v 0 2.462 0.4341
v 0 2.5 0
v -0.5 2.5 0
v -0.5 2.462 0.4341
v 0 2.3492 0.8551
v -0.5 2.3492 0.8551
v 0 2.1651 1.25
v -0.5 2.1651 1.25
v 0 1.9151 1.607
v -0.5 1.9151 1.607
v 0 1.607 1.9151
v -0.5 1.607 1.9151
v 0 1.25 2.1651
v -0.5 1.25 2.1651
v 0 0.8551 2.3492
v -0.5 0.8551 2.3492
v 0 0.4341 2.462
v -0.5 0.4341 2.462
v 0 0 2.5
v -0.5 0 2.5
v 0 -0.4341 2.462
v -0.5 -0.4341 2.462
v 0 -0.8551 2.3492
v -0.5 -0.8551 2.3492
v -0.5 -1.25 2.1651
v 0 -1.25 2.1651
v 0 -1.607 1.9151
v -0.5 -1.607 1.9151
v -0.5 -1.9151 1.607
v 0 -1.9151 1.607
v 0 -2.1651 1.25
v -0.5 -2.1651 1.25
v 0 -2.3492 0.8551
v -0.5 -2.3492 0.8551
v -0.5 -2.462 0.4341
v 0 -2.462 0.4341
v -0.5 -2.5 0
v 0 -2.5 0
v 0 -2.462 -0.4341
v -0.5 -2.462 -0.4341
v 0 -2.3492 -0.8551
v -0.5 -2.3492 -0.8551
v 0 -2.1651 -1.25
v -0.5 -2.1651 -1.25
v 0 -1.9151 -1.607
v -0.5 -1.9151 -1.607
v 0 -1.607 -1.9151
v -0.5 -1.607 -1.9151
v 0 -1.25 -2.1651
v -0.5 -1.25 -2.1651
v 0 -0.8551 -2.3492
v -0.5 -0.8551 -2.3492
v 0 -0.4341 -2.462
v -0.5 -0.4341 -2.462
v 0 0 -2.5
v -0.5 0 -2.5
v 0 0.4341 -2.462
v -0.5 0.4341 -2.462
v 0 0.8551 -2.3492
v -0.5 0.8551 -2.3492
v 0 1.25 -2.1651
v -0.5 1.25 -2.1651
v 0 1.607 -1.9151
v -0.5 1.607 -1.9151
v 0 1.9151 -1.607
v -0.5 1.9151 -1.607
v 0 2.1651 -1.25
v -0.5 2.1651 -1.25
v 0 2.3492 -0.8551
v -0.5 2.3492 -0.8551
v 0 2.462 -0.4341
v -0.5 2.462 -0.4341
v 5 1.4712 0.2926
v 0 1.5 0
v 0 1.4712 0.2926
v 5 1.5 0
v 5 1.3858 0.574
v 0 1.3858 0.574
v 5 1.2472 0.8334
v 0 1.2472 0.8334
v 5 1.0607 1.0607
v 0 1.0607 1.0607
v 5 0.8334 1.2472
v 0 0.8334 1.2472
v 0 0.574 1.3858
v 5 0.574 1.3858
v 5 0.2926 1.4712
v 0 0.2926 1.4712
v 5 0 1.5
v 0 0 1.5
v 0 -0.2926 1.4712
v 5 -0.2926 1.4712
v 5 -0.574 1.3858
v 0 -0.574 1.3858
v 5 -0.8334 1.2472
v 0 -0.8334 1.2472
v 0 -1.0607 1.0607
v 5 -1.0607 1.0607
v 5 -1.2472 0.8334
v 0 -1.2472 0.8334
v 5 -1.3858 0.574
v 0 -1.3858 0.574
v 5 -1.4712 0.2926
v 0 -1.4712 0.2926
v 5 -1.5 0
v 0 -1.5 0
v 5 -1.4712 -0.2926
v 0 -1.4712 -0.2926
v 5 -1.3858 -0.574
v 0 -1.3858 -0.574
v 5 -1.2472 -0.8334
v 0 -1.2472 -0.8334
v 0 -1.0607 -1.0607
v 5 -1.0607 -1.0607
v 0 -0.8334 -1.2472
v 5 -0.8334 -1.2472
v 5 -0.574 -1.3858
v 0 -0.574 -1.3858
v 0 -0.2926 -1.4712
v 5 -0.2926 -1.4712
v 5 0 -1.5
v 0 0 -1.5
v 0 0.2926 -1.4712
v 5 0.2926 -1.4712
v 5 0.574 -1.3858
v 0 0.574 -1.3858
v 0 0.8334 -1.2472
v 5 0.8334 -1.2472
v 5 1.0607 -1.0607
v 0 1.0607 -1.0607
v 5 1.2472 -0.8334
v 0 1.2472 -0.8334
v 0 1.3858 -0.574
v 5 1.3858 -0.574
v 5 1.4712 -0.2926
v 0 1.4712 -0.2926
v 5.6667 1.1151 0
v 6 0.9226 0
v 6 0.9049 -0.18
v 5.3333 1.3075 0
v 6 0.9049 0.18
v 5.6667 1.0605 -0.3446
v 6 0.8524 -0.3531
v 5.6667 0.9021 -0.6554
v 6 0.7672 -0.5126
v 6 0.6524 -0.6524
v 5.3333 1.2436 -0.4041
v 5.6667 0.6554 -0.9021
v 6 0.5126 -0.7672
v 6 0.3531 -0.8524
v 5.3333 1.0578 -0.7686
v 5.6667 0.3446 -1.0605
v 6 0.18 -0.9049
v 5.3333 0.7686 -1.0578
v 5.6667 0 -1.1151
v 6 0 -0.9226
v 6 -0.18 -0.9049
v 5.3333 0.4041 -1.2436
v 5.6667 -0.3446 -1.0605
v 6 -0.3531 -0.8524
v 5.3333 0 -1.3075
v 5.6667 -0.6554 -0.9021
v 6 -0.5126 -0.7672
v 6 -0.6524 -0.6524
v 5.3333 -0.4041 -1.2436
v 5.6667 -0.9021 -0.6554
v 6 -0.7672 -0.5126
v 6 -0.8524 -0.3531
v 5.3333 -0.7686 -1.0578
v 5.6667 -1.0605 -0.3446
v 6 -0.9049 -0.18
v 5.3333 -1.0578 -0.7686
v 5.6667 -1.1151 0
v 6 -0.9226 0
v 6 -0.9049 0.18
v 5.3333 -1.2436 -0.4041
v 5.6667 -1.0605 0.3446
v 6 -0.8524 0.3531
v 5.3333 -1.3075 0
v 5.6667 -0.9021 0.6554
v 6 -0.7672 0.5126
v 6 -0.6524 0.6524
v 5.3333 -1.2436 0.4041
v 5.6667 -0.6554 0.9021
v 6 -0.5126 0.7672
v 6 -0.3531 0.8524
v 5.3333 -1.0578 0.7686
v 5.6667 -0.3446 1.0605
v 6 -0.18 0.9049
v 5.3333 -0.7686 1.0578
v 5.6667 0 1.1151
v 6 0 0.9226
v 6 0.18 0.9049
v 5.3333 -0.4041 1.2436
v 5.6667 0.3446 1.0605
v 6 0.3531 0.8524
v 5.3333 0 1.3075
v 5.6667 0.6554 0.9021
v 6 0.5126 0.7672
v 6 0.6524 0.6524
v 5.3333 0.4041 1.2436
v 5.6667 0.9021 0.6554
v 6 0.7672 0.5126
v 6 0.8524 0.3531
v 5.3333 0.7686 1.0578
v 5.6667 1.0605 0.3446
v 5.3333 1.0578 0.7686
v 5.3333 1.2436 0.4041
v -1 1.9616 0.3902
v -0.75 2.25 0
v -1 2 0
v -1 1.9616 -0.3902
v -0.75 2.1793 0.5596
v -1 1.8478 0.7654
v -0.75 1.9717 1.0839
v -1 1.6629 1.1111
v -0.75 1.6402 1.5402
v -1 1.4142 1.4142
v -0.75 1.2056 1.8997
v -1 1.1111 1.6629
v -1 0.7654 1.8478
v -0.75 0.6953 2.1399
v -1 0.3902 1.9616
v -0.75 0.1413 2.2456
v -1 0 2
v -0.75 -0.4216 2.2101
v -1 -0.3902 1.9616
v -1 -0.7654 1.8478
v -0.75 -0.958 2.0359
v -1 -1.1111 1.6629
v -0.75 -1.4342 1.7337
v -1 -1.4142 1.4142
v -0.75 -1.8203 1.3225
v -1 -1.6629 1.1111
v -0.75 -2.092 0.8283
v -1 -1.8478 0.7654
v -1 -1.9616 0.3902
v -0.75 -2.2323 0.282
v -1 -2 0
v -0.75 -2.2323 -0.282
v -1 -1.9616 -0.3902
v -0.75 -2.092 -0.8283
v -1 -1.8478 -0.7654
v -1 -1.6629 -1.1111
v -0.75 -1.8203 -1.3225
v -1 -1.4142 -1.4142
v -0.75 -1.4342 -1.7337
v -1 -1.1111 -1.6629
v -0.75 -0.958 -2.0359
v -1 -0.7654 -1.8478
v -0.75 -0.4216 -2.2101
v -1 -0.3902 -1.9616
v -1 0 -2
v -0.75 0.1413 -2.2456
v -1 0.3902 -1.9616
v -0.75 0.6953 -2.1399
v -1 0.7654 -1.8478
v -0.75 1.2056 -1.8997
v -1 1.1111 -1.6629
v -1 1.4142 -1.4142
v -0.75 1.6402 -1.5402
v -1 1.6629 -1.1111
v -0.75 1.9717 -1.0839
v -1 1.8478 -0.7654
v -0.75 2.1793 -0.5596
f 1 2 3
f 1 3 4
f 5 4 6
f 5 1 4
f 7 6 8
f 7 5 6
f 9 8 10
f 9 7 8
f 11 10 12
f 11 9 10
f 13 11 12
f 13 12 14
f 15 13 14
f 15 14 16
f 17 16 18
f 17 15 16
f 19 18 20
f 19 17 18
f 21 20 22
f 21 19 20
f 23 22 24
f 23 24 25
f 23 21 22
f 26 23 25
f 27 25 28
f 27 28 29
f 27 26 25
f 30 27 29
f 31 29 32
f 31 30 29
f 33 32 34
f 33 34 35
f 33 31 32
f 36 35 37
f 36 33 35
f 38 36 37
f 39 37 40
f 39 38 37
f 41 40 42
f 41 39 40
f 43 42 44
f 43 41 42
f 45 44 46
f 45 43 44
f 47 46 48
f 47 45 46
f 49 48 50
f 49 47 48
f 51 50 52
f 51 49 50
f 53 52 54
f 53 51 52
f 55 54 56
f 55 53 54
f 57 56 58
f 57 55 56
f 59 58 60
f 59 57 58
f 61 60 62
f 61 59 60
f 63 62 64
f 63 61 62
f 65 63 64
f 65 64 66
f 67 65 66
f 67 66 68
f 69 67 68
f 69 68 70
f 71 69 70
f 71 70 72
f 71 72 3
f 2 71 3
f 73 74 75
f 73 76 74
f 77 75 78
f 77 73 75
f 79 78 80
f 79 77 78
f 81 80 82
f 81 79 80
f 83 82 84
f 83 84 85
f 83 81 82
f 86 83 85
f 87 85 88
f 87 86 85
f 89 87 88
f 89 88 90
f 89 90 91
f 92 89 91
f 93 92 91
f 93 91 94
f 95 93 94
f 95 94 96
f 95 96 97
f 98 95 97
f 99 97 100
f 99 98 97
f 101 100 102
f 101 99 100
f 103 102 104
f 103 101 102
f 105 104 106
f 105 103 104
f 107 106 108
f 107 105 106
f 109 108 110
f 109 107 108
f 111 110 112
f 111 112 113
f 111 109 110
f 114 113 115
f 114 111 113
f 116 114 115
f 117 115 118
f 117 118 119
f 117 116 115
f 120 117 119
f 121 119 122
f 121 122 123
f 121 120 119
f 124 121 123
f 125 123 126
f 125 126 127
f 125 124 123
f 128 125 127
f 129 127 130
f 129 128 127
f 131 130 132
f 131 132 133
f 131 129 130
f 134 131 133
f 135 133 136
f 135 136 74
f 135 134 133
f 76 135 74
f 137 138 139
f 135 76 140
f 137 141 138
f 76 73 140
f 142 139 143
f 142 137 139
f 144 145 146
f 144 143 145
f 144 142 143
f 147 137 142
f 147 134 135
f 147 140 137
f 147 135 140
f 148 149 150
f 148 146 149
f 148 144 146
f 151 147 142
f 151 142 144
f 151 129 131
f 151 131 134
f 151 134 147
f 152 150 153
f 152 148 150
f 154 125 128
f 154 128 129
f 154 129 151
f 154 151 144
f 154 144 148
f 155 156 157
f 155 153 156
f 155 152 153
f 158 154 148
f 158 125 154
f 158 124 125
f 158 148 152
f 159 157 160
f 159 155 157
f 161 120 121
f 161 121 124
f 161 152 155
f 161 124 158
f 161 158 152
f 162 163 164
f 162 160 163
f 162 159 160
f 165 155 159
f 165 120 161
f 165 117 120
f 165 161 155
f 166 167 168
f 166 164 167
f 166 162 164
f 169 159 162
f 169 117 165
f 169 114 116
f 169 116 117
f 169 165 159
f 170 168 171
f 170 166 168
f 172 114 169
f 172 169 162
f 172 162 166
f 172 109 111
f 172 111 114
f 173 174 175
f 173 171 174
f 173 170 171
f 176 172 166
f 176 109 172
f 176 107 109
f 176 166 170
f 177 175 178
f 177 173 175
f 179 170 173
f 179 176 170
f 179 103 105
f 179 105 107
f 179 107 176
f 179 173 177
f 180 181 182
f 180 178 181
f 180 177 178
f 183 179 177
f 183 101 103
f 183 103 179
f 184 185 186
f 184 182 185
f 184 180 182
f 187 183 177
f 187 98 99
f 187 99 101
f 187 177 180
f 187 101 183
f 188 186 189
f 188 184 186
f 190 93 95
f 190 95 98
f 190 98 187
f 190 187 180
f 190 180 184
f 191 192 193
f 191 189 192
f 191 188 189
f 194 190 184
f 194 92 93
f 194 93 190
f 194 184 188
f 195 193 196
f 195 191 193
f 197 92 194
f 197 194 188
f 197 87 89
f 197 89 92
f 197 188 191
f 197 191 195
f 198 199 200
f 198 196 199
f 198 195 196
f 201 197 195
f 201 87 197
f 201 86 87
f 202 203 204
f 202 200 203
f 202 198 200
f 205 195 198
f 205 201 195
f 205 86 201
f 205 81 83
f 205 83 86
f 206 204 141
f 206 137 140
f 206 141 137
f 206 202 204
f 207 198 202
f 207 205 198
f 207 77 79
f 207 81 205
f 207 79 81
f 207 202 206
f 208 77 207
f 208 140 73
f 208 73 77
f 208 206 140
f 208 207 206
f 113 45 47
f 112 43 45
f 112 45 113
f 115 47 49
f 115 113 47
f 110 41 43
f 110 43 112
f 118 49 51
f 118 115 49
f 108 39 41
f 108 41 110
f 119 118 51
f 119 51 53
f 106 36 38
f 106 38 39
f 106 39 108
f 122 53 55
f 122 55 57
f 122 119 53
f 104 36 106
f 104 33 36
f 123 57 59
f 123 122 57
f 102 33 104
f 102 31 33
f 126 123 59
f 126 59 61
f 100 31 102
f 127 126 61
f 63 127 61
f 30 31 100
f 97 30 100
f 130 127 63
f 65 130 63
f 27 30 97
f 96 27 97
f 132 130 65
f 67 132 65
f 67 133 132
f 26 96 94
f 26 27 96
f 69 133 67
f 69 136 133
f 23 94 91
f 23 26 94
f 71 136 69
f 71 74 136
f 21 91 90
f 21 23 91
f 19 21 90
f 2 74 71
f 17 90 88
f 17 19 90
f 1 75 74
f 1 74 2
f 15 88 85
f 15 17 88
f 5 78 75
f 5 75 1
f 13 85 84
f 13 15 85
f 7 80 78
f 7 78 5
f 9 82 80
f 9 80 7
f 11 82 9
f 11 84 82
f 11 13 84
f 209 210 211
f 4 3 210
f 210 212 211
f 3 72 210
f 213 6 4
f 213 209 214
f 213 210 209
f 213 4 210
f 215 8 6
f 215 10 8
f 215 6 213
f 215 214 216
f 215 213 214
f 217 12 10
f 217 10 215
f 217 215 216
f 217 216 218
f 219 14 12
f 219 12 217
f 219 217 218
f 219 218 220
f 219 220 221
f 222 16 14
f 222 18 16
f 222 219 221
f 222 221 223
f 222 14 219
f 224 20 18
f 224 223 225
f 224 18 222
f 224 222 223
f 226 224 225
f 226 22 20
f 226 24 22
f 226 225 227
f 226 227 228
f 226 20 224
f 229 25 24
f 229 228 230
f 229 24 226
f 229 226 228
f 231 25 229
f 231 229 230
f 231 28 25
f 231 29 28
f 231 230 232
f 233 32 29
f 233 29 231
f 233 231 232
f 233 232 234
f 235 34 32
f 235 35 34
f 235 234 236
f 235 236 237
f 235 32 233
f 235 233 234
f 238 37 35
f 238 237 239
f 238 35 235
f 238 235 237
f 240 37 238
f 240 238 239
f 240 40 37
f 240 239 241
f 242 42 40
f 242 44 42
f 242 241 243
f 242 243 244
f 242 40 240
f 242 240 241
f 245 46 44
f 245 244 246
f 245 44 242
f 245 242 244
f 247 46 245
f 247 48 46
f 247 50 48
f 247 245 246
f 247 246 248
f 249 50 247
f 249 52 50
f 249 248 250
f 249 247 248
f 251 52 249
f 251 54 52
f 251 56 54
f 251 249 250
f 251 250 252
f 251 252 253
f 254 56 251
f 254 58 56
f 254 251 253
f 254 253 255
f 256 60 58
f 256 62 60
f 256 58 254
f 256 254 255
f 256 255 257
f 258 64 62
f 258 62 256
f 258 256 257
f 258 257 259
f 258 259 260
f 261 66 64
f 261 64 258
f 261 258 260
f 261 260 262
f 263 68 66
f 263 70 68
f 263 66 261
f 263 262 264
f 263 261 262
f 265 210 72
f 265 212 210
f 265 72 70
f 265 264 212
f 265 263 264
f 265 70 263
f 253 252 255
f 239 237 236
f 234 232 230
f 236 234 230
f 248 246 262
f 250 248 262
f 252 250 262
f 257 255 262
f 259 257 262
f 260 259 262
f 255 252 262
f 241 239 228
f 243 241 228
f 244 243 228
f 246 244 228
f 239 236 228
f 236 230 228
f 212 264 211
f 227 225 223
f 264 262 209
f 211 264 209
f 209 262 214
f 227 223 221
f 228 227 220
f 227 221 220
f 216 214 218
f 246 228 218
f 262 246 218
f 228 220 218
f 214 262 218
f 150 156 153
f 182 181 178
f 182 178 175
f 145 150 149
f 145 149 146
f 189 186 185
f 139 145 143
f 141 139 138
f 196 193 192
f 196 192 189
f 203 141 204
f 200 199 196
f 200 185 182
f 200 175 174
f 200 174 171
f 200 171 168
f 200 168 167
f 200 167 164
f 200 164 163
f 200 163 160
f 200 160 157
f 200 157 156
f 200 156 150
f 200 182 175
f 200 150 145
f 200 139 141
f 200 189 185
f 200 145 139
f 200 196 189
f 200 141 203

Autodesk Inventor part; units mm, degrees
ref_plane "YZ Plane" through (0, 0, 0) normal (1, 0, 0) x (0, 1, 0)
ref_plane "XZ Plane" through (0, 0, 0) normal (0, 1, 0) x (-1, 0, 0)
ref_plane "XY Plane" through (0, 0, 0) normal (0, 0, 1) x (1, 0, 0)
sketch "Skizze1" plane through (0, 0, 0) normal (0, 0, 1) x (1, 0, 0)
  line L0 (-1, 0) -> (-1, 2.5)
  line L1 (-1, 2.5) -> (0, 2.5)
  line L2 (0, 2.5) -> (0, 1.5)
  line L3 (0, 1.5) -> (6, 1.5)
  line L4 (6, 1.5) -> (6, 0)
  line L5 (-1, 0) -> (6, 0)
  line L6 (-4, 0) -> (17, 0) projected
  line L7 (0, -0.5) -> (0, 3) projected
  dimension "d0" = 1
  dimension "d1" = 6
  dimension "d2" = 3
  dimension "d3" = 5
revolve "Körper" add sketch "Skizze1" angle 360 about axis through (-1, 0, 0) along (1, 0, 0)
chamfer "Fase1" distance 1 angle 30 1 edges at (6, -1.5, 0) measured on face at (2, 1.4806, -0.2406)
chamfer "Fase2" distance 0.5 angle 45 1 edges at (-1, -2.5, 0) measured on face at (-0.6667, 2.4919, -0.2012)
equation "\"d0\" = KOH"
equation "\"d1\" = NLG"
equation "\"d2\" = NND"
equation "\"d3\" = KOD"
equation "\"d7\" = PHH1"
equation "\"d8\" = FAWI1"
equation "\"d12\" = PHH1"
equation "\"d4\" = PHH2"
equation "\"d6\" = FAWI2"
equation "\"d13\" = PHH2"
equation "\"NLG\" = 6"
equation "\"KOH\" = 1"
equation "\"KOD\" = 5"
equation "\"NND\" = 3"
equation "\"FAWI1\" = 30deg"
equation "\"FAWI2\" = 45deg"
equation "\"PHH2\" = 0.5"
equation "\"PHH1\" = 1"
properties part number "ISO 2341 - A - 3 x 6" material "Stahl"
